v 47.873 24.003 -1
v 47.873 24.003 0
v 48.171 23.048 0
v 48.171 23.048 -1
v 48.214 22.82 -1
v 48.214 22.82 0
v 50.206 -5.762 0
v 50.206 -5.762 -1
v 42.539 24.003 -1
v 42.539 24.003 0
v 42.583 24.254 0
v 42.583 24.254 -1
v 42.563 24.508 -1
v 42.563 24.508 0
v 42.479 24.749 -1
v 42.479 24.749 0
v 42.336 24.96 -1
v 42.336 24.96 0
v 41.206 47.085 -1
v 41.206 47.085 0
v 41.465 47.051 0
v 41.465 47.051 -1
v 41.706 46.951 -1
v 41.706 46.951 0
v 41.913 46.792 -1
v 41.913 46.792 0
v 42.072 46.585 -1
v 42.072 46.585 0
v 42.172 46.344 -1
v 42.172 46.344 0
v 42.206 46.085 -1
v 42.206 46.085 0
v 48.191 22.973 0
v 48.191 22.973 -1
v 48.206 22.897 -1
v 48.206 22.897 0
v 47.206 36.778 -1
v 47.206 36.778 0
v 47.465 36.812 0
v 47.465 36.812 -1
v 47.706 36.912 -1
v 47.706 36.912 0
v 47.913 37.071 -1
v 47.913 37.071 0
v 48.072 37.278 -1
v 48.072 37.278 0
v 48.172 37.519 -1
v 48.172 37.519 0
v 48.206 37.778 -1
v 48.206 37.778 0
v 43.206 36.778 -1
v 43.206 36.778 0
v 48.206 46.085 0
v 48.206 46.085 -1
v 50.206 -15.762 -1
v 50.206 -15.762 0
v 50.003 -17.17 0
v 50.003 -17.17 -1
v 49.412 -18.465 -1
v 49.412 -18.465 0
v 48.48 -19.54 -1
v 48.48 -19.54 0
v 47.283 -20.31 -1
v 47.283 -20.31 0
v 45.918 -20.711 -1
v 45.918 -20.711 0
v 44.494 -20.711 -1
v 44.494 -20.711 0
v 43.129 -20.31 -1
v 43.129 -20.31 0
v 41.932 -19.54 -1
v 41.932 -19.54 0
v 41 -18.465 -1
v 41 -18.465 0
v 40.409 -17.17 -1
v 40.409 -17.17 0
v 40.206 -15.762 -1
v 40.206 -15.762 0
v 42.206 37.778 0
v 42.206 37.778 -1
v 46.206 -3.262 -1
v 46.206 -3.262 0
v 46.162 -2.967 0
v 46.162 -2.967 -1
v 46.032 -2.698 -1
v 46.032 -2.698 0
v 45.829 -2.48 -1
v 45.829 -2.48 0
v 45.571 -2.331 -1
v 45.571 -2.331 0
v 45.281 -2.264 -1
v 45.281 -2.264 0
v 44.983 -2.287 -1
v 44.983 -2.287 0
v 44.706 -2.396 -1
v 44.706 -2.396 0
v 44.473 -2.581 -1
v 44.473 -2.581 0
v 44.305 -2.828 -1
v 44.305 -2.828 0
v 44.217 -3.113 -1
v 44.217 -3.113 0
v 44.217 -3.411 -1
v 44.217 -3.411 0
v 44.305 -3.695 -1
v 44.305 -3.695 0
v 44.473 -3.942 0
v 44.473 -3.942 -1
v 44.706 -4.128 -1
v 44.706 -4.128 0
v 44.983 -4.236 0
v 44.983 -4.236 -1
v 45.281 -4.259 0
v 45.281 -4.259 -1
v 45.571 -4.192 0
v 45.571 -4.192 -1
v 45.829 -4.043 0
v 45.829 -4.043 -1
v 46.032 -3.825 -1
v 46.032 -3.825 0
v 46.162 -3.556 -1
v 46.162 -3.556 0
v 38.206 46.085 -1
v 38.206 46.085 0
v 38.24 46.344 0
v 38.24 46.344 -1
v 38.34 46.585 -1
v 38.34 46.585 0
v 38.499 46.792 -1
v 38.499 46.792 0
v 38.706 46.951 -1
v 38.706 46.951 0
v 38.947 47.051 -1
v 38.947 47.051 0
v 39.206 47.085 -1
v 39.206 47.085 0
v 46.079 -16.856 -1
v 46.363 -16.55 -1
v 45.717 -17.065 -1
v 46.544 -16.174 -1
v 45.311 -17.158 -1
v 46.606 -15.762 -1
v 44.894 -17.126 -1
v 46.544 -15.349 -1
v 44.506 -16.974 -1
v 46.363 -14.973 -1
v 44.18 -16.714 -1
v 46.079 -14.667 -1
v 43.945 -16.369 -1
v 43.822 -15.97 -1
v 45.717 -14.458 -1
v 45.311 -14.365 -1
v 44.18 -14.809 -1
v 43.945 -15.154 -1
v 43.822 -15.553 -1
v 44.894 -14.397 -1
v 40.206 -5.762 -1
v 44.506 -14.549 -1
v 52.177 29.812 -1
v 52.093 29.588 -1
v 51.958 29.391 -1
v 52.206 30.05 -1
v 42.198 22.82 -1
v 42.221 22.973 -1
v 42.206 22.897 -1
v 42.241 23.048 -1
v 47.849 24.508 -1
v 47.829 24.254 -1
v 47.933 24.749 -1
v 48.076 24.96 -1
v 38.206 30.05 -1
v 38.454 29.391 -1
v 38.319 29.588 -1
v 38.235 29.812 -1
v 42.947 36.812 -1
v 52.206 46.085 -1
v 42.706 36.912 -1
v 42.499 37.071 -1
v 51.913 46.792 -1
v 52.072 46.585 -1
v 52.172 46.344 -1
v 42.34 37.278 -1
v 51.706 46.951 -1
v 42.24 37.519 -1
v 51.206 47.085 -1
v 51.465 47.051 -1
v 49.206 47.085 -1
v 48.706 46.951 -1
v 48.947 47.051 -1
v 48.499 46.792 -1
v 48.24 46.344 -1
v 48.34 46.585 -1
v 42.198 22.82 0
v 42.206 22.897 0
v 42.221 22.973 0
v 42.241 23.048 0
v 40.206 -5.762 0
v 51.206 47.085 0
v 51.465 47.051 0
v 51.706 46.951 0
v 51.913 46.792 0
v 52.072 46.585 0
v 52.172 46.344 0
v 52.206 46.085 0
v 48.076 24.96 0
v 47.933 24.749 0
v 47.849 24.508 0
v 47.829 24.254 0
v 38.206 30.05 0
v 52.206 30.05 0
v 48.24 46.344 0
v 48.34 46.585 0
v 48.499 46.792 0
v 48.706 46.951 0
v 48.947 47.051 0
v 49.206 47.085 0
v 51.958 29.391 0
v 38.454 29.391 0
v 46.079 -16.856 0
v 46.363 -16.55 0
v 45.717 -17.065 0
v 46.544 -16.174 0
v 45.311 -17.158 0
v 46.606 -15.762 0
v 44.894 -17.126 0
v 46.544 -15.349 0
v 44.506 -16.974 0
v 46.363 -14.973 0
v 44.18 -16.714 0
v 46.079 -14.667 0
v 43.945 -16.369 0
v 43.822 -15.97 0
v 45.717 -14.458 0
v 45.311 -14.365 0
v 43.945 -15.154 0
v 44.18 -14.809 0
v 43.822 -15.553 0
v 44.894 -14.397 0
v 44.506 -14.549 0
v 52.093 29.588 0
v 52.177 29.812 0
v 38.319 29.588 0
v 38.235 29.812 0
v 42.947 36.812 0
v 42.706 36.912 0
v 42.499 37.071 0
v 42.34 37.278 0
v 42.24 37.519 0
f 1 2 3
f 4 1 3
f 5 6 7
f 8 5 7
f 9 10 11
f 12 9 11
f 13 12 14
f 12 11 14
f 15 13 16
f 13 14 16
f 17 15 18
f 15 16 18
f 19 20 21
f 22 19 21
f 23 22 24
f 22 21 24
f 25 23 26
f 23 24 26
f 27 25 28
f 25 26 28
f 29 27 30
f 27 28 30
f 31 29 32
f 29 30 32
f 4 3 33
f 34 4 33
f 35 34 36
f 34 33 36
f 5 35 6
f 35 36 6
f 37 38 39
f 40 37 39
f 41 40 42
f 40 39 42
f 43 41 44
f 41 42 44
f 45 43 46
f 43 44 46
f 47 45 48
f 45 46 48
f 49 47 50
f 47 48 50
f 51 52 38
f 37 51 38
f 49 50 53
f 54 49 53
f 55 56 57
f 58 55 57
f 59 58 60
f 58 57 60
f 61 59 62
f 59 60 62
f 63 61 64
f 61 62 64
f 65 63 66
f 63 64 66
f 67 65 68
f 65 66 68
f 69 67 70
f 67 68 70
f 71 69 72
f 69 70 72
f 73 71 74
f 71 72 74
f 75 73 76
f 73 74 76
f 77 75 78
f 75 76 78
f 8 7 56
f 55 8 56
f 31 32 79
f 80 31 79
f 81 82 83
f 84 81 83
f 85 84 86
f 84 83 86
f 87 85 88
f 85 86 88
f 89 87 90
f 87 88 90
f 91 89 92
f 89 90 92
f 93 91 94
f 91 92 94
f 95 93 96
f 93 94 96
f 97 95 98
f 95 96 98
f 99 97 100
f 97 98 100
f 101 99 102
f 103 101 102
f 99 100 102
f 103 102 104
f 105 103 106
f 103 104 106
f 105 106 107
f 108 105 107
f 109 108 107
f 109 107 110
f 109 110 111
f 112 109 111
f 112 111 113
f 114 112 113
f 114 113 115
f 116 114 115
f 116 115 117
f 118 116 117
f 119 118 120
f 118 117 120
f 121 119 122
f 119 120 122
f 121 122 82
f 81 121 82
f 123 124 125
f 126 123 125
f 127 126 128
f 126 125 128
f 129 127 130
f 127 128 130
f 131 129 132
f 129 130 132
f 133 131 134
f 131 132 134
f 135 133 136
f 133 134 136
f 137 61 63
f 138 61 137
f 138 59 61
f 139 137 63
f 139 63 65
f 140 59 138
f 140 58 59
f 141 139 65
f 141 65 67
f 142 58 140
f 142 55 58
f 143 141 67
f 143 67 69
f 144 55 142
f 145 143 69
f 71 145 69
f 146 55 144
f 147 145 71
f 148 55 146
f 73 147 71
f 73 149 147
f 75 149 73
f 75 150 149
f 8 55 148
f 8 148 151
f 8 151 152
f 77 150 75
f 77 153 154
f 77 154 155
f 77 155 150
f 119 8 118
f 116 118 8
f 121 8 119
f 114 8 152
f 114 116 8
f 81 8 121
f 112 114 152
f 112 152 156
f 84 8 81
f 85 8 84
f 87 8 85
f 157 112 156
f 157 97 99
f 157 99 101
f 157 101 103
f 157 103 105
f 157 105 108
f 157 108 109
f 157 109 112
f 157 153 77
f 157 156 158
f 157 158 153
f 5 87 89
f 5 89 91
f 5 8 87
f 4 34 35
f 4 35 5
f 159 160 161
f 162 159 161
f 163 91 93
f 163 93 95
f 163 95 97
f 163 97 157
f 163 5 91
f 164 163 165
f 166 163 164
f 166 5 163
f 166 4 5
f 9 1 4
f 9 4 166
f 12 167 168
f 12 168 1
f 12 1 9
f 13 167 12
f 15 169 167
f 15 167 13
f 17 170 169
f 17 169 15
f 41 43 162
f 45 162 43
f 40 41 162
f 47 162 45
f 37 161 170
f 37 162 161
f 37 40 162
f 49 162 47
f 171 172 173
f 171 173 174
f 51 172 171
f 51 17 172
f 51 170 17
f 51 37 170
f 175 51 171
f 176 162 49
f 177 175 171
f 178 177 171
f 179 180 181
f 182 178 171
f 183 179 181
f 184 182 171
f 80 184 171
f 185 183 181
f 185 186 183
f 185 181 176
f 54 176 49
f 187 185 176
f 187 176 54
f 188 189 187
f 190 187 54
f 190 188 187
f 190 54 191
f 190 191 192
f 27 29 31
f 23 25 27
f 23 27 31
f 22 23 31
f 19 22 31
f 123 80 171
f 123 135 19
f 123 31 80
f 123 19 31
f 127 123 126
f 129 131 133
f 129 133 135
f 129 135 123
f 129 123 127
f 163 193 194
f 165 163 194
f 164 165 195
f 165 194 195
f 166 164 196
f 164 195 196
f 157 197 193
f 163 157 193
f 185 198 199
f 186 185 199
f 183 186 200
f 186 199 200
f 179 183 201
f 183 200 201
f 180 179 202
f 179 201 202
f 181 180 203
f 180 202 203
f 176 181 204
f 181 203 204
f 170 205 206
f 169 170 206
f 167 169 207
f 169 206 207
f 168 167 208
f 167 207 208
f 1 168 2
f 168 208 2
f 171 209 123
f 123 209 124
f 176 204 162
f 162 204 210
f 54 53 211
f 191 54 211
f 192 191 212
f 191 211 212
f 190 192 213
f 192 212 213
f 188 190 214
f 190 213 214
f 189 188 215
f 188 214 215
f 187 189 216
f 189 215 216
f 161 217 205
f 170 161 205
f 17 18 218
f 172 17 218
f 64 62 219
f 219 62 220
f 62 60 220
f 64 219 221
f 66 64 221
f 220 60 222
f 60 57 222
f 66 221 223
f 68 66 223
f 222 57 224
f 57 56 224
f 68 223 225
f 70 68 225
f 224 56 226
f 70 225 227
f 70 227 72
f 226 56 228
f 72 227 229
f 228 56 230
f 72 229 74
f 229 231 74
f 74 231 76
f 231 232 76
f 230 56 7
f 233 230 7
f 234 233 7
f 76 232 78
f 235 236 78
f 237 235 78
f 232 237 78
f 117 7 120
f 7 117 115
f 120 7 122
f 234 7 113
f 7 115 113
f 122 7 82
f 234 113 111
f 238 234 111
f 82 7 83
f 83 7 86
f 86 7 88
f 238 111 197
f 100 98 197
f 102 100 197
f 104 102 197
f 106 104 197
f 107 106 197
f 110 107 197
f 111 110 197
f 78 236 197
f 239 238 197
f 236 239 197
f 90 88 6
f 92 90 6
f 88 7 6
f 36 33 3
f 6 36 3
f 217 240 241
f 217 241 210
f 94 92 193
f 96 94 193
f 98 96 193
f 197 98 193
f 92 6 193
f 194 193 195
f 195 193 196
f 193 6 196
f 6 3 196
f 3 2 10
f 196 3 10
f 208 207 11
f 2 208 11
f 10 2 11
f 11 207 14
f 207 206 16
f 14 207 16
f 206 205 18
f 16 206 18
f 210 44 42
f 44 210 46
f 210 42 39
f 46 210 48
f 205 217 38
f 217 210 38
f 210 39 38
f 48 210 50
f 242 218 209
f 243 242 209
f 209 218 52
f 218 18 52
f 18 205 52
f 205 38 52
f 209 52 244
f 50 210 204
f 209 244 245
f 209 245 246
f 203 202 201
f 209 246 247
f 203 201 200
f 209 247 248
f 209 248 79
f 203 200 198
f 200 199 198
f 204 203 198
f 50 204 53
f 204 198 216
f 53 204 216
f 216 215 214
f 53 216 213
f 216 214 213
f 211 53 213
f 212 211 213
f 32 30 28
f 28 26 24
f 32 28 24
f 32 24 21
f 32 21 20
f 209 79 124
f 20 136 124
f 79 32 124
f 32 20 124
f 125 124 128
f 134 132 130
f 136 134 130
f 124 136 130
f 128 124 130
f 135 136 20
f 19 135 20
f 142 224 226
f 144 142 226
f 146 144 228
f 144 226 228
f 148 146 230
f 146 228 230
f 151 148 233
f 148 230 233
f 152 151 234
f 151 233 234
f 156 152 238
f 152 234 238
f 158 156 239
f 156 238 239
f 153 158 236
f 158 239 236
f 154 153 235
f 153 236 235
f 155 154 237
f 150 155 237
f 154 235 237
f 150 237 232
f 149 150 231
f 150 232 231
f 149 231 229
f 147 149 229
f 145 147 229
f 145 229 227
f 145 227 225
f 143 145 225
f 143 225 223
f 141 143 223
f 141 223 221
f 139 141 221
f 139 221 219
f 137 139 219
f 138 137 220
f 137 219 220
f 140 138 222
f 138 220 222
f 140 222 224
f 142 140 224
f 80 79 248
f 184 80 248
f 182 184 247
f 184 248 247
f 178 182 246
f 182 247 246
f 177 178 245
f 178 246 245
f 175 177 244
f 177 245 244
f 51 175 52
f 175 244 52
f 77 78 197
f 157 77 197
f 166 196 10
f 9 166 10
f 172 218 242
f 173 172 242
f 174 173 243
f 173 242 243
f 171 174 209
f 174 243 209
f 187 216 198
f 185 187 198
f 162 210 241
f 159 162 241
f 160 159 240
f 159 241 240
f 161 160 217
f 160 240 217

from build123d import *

# Parameters (mm, degrees)
MODEL_R           = 1.4
MODEL_R_2         = 1
BRIDA_BASE1_DEPTH = 1


# Sheet-metal steps are written as plain solids
with BuildPart() as part:
    # Model → Brida base1 (new body)
    with BuildSketch(Plane.XY):
        with BuildLine():
            Line((40.2059904, -5.7615616), (42.197855138, 22.819737764))
            ThreePointArc((42.197855138, 22.819737764), (42.212695742, 22.935208537), (42.240856149, 23.048171958))
            Line((42.240856149, 23.048171958), (42.538911562, 24.003067399))
            ThreePointArc((42.538911562, 24.003067399), (42.562673339, 24.508023196), (42.336424948, 24.960081427))
            Line((42.336424948, 24.960081427), (38.453897645, 29.390683716))
            ThreePointArc((38.453897645, 29.390683716), (38.270016908, 29.697670508), (38.2059904, 30.049740987))
            Line((38.2059904, 30.049740987), (38.2059904, 46.085251303))
            ThreePointArc((38.2059904, 46.085251303), (38.498883619, 46.792358084), (39.2059904, 47.085251303))
            Line((39.2059904, 47.085251303), (41.2059904, 47.085251303))
            ThreePointArc((41.2059904, 47.085251303), (41.913097181, 46.792358084), (42.2059904, 46.085251303))
            Line((42.2059904, 46.085251303), (42.2059904, 37.778119438))
            ThreePointArc((42.2059904, 37.778119438), (42.498883619, 37.071012657), (43.2059904, 36.778119438))
            Line((43.2059904, 36.778119438), (47.2059904, 36.778119438))
            ThreePointArc((47.2059904, 36.778119438), (47.913097181, 37.071012657), (48.2059904, 37.778119438))
            Line((48.2059904, 37.778119438), (48.2059904, 46.085251303))
            ThreePointArc((48.2059904, 46.085251303), (48.498883619, 46.792358084), (49.2059904, 47.085251303))
            Line((49.2059904, 47.085251303), (51.2059904, 47.085251303))
            ThreePointArc((51.2059904, 47.085251303), (51.913097181, 46.792358084), (52.2059904, 46.085251303))
            Line((52.2059904, 46.085251303), (52.2059904, 30.049740987))
            ThreePointArc((52.2059904, 30.049740987), (52.141963892, 29.697670508), (51.958083155, 29.390683716))
            Line((51.958083155, 29.390683716), (48.075555852, 24.960081427))
            ThreePointArc((48.075555852, 24.960081427), (47.849307461, 24.508023196), (47.873069238, 24.003067399))
            Line((47.873069238, 24.003067399), (48.171124651, 23.048171958))
            ThreePointArc((48.171124651, 23.048171958), (48.199285058, 22.935208537), (48.214125662, 22.819737764))
            Line((48.214125662, 22.819737764), (50.2059904, -5.7615616))
            Line((50.2059904, -5.7615616), (50.2059904, -15.7615616))
            ThreePointArc((50.2059904, -15.7615616), (45.2059904, -20.7615616), (40.2059904, -15.7615616))
            Line((40.2059904, -15.7615616), (40.2059904, -5.7615616))
        make_face()
        with Locations((45.2059904, -15.7615616)):
            Circle(MODEL_R, mode=Mode.SUBTRACT)
        with Locations((45.2059904, -3.2615616)):
            Circle(MODEL_R_2, mode=Mode.SUBTRACT)
    extrude(amount=-BRIDA_BASE1_DEPTH)


solid = part.part
